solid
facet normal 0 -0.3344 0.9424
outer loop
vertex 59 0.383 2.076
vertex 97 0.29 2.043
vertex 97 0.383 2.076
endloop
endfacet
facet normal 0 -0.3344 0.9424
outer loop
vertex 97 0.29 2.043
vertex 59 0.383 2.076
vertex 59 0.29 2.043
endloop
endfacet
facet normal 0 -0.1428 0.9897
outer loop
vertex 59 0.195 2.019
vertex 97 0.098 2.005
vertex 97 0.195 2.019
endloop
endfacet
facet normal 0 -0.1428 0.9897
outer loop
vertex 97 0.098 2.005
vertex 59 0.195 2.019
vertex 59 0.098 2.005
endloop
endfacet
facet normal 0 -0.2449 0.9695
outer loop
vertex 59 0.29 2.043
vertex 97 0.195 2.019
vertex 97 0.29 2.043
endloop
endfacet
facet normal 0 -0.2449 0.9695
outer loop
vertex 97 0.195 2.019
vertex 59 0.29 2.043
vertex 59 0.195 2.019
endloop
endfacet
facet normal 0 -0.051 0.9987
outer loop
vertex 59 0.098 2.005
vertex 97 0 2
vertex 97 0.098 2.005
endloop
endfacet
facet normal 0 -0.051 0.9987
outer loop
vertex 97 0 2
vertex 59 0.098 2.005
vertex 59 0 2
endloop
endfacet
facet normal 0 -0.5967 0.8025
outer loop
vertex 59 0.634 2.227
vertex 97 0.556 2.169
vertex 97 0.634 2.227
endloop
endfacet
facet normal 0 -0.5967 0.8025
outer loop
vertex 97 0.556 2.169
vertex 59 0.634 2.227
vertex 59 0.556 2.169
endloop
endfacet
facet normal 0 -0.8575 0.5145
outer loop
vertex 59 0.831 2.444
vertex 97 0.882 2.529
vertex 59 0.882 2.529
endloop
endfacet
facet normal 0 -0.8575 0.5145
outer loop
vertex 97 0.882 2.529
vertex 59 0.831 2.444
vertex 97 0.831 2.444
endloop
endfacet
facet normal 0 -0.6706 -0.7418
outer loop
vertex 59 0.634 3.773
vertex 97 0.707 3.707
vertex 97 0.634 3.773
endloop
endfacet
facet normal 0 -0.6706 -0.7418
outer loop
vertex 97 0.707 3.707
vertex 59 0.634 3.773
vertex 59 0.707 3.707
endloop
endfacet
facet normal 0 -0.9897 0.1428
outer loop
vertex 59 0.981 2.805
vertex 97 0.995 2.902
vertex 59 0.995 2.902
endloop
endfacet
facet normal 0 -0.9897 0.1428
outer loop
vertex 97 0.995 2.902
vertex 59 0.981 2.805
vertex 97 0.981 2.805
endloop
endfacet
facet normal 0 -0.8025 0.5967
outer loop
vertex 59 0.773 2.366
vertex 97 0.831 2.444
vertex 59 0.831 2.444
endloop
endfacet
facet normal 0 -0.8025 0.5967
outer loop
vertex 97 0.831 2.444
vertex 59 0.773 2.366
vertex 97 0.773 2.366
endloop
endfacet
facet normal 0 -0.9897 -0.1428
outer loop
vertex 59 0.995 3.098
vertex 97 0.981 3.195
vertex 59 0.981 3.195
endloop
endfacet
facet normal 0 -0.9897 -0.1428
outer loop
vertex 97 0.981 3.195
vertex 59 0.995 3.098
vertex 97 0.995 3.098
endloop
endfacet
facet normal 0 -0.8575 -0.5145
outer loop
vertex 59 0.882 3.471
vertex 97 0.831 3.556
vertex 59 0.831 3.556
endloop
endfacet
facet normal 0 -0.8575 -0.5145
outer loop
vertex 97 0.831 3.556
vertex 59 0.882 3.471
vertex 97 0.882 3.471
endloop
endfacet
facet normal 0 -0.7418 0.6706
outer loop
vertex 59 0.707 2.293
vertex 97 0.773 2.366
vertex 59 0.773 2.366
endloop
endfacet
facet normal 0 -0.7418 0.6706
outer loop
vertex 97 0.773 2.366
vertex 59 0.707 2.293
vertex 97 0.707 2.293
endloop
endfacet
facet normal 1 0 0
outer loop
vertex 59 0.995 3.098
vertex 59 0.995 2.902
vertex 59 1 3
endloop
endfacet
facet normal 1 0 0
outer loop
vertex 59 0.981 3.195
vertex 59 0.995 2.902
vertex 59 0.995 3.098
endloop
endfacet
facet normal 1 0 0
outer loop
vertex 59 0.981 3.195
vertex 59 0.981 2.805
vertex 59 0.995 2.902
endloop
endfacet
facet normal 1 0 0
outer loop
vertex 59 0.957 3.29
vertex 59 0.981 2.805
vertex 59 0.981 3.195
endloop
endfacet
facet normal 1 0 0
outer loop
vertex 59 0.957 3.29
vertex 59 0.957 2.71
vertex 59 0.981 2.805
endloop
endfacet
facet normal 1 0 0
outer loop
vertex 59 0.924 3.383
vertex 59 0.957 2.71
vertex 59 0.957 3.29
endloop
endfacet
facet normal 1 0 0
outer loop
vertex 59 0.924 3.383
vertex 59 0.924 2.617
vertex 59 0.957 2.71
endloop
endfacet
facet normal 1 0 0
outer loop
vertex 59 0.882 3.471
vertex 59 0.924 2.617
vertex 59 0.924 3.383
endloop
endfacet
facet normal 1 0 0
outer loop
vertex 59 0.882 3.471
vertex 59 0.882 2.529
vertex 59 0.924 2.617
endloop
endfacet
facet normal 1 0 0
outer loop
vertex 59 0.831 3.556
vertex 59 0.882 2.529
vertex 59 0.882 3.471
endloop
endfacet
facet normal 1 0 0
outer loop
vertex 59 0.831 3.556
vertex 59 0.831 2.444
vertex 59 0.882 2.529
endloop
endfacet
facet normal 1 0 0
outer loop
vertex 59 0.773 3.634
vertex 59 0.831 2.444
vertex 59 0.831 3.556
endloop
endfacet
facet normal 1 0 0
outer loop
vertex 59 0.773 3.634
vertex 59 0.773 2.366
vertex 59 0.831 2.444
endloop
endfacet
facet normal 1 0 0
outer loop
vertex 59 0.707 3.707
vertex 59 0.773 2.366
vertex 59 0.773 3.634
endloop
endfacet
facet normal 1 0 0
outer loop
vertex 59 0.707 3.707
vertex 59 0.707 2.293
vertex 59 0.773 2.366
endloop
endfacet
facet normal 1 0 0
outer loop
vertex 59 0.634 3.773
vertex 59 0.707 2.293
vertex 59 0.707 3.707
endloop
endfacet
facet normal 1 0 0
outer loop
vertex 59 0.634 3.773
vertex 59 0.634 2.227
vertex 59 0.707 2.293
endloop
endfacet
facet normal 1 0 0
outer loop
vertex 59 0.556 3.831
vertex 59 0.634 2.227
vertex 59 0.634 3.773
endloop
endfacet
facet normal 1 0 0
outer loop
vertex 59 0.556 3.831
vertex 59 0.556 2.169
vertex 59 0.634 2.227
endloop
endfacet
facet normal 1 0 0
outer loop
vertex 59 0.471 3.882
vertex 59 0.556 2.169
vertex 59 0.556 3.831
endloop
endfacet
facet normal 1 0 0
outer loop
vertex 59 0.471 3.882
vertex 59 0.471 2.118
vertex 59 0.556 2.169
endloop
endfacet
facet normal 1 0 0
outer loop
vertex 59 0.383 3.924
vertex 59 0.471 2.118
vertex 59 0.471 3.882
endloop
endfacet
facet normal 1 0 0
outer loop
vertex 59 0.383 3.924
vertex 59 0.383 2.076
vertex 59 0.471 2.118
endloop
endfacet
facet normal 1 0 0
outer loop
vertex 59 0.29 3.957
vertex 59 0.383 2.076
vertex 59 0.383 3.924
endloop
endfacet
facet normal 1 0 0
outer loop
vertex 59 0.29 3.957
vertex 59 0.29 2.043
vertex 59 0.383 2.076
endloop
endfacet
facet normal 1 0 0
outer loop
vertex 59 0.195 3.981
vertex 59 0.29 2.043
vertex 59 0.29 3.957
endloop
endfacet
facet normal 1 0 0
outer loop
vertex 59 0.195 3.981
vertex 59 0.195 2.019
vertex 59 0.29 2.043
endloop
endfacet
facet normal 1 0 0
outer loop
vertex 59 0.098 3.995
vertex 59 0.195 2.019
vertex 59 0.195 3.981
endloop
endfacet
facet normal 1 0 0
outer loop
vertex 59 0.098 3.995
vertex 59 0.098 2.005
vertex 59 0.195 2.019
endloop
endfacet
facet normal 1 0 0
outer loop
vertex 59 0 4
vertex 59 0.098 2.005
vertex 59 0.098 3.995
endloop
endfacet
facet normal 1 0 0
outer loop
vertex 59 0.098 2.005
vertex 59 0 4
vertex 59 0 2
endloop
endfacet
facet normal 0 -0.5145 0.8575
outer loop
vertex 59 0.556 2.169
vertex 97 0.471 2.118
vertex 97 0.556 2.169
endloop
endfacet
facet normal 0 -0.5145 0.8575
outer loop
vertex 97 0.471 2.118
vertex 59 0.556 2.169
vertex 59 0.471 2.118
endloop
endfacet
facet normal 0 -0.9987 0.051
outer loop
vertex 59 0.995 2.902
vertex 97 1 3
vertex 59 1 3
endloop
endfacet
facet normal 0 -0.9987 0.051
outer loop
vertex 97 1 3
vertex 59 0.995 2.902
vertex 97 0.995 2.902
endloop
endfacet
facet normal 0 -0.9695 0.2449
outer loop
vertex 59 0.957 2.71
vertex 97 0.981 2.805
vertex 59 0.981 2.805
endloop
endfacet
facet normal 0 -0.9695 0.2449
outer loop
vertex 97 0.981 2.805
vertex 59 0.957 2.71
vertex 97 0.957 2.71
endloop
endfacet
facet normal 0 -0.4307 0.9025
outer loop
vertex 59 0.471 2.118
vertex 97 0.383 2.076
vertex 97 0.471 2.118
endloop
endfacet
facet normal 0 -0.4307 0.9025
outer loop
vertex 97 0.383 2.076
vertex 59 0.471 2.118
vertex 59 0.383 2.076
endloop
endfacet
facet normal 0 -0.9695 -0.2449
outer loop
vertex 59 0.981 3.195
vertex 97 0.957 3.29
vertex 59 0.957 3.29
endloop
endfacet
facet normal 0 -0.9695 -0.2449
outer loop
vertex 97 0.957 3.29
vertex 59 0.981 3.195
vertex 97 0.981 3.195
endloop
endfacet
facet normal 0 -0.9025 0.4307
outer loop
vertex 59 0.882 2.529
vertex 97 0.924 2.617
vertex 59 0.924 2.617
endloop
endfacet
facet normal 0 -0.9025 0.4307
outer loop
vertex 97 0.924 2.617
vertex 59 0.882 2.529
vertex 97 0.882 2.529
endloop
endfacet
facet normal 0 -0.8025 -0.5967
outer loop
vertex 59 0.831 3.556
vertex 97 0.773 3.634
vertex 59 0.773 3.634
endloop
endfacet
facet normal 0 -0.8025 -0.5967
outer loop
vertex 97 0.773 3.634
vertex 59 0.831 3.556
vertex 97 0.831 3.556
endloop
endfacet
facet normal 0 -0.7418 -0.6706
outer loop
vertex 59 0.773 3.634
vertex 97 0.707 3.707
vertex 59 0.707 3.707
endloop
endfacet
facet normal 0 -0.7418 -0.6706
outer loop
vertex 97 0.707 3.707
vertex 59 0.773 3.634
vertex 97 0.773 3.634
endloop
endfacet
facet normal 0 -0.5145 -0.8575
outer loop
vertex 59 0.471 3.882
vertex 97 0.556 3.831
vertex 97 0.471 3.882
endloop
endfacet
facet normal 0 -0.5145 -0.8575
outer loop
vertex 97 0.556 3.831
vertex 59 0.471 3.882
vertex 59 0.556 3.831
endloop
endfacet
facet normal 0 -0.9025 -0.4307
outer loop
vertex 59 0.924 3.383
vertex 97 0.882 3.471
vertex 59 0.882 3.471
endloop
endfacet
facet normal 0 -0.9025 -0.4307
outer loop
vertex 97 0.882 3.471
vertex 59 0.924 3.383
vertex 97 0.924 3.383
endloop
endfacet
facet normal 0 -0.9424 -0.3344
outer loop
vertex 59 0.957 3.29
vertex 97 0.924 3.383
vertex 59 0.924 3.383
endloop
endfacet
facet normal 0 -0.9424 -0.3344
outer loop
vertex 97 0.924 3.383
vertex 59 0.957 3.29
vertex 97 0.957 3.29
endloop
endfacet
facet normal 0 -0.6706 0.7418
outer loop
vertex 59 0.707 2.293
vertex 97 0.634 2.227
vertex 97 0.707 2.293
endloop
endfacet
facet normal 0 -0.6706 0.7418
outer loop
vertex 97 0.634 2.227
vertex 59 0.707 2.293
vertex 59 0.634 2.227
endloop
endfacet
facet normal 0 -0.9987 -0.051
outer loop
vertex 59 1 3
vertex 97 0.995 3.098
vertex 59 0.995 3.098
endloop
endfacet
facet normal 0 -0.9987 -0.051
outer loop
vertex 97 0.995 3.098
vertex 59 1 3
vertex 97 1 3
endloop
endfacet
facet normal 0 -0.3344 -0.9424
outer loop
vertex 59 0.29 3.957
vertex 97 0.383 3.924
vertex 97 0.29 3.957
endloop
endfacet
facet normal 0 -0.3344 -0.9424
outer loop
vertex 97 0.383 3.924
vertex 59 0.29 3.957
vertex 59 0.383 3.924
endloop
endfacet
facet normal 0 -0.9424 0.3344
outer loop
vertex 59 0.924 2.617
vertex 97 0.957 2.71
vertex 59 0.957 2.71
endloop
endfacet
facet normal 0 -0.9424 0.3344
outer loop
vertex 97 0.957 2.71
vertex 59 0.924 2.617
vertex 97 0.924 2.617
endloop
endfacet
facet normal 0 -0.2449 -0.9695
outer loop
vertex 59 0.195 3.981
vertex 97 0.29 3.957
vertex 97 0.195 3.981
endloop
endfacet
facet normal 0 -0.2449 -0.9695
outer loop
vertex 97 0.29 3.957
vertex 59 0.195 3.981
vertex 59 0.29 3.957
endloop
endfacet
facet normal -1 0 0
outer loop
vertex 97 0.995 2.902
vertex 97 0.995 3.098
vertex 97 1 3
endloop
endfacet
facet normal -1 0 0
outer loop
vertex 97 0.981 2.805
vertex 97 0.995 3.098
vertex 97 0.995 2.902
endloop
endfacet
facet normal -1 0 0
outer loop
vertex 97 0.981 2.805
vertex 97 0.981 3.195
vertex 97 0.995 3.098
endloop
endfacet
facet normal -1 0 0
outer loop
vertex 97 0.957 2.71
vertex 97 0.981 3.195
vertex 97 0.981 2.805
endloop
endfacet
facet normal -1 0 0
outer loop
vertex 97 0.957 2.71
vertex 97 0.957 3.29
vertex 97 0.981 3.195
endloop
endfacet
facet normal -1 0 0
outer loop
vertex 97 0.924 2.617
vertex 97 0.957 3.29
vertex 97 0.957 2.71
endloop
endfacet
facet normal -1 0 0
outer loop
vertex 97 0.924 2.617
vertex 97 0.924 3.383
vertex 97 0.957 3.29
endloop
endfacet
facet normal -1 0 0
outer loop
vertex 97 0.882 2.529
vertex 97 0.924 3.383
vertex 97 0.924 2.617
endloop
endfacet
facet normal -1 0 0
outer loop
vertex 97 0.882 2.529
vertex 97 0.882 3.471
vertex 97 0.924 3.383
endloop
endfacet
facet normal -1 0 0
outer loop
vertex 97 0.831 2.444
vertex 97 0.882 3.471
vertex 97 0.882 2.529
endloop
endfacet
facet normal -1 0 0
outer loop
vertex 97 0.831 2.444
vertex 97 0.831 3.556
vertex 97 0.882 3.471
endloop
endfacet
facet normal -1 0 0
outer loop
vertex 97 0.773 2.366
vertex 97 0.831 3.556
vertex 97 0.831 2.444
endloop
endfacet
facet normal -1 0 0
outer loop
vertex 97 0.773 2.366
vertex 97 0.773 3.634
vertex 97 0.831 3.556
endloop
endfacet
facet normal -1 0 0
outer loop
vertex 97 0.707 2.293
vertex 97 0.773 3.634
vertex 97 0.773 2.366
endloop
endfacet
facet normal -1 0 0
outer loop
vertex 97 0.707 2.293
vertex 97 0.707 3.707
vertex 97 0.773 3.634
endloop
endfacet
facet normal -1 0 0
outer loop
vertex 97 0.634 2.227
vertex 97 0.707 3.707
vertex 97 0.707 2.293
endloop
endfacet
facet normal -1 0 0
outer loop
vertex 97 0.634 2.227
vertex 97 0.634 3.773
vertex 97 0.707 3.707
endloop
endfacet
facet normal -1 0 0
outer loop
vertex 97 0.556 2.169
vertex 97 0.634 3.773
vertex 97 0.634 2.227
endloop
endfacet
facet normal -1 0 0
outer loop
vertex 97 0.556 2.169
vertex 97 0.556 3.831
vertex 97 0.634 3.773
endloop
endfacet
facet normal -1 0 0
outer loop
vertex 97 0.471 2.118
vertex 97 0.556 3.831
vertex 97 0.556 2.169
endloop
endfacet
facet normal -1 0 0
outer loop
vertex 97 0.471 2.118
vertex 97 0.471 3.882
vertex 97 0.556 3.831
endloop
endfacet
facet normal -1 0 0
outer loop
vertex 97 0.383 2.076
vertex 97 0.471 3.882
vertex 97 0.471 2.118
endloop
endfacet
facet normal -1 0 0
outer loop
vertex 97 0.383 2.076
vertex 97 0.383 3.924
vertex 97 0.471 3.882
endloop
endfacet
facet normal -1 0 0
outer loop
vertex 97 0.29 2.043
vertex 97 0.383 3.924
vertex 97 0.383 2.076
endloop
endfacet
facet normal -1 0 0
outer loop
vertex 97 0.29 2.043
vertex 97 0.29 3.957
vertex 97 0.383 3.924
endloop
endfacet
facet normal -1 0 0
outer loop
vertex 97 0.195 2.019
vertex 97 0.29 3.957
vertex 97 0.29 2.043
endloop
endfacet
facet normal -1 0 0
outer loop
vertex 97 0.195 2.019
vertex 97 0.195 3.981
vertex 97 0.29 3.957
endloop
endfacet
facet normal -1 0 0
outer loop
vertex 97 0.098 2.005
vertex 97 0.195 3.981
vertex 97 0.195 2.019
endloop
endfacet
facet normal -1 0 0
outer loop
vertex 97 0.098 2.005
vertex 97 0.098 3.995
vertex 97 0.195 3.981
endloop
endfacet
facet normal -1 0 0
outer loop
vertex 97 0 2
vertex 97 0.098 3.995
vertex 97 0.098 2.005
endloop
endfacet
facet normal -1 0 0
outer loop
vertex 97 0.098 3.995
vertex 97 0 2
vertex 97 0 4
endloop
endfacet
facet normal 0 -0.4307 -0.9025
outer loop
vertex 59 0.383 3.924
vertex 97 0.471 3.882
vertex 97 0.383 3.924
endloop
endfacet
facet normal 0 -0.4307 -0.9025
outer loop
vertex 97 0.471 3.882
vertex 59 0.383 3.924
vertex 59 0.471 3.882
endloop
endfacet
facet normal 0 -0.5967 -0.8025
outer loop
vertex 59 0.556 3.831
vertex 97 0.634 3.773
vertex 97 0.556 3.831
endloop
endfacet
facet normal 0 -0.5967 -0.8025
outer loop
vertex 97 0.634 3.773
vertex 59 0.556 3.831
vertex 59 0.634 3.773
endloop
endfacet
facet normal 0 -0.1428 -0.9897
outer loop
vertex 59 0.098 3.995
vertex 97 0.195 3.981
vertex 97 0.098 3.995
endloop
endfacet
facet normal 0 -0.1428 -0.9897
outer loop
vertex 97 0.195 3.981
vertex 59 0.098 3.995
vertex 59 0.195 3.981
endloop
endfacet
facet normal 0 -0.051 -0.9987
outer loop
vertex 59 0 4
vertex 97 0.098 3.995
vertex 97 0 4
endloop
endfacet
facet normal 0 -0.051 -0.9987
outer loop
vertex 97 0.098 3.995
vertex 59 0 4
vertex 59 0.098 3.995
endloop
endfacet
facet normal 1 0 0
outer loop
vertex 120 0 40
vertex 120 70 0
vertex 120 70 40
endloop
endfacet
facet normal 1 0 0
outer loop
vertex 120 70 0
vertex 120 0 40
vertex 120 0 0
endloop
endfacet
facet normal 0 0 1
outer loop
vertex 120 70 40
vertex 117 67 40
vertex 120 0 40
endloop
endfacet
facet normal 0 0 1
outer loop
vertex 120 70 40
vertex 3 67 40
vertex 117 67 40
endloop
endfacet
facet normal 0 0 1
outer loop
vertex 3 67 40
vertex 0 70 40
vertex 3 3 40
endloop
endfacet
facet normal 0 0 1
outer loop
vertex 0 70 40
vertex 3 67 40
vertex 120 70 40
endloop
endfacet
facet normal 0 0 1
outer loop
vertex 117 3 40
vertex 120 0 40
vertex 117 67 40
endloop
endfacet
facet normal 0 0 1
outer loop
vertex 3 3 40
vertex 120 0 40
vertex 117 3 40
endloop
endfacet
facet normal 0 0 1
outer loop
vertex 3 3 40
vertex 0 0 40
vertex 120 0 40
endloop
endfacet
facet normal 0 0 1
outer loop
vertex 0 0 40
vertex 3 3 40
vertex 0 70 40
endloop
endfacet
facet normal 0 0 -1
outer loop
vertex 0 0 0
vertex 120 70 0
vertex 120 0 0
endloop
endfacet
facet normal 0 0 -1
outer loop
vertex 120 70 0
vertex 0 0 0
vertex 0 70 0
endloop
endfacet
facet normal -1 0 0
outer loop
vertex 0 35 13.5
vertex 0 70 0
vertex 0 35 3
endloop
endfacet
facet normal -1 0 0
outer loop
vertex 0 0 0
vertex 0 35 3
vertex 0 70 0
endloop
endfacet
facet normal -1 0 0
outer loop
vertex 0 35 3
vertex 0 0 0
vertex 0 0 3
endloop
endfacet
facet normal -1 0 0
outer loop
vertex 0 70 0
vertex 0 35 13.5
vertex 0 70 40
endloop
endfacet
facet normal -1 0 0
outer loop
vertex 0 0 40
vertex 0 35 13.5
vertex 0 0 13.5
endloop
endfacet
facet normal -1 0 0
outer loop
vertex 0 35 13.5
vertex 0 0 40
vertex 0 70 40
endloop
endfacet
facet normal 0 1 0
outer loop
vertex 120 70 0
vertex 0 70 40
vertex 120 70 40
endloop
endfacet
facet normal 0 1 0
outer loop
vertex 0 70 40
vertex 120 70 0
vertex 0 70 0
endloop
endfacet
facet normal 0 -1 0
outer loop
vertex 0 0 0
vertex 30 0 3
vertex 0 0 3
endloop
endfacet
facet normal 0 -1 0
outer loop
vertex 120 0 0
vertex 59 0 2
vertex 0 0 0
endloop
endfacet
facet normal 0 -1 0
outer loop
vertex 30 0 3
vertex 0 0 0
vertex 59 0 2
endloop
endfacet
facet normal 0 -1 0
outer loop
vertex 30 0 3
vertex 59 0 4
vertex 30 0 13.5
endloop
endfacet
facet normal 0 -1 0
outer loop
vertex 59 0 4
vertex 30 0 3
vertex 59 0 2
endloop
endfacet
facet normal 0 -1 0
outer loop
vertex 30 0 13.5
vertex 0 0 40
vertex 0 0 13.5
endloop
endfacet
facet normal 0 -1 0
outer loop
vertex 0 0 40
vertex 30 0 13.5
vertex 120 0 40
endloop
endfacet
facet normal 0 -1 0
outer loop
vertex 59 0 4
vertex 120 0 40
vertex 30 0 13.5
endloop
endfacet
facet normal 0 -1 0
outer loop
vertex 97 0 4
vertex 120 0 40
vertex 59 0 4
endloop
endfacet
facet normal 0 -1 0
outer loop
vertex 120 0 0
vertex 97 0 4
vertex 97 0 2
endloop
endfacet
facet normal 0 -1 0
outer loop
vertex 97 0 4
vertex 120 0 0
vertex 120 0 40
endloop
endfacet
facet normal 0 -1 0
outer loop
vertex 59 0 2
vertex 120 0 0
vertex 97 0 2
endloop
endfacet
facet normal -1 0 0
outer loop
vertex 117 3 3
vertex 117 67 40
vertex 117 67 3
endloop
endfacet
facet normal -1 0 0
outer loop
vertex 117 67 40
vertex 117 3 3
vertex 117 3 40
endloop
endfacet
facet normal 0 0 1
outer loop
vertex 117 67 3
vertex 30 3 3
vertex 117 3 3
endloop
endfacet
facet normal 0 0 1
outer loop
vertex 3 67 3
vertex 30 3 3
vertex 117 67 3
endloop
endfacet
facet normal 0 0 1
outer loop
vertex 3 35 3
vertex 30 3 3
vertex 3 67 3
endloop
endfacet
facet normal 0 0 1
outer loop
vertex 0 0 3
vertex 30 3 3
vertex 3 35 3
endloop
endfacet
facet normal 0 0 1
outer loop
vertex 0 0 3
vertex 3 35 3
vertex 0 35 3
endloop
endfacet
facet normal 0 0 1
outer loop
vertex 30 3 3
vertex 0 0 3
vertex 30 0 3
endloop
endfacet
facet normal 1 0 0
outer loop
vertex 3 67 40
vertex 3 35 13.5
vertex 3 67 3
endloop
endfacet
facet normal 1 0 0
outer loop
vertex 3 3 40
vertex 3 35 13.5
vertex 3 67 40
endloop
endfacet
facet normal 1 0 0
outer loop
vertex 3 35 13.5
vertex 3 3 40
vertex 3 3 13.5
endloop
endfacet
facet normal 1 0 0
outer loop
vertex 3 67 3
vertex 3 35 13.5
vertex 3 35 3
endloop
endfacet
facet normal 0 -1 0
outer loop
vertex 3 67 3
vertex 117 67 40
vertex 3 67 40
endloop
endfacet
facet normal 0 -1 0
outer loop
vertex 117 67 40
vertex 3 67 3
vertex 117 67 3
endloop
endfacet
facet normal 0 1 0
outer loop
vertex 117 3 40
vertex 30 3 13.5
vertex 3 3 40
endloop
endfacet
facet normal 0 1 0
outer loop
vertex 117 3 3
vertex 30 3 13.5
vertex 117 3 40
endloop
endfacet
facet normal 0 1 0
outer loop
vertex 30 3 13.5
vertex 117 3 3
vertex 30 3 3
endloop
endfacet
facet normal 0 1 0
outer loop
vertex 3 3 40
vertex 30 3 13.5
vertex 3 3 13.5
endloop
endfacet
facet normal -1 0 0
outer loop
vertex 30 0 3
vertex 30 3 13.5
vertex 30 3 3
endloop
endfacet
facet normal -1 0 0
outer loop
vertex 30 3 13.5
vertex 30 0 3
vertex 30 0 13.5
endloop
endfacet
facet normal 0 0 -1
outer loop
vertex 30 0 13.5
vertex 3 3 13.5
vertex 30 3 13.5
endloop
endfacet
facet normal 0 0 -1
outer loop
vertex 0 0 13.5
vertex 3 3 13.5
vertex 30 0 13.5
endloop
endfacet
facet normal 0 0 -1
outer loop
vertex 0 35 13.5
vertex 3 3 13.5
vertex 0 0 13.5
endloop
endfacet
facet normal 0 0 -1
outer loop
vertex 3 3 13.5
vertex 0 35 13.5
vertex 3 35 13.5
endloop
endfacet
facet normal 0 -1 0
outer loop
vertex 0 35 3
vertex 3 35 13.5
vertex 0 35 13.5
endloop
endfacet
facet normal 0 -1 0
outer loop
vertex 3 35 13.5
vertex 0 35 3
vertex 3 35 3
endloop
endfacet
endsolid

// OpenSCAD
// Buffer tank for mini horizontal gel-electrophoresis box
// Units: mm. Tank rests on XY plane at z = 0, builds upward (+Z).

$fn = 64;

// ---- Tank ----
tank_x      = 120;   // outer length (X)
tank_y      = 70;    // outer width (Y)
tank_h      = 40;    // outer height (Z)
wall        = 3;     // wall thickness
floor_t     = 3;     // floor thickness

// ---- Gel-tray platform ----
plat_x      = 60;    // platform length in X (centred)
plat_top_z  = 13;    // platform top height above inner floor (z = 13)

// ---- Electrode holes ----
hole_d      = 2;     // electrode hole diameter
hole_y      = 0;     // electrode hole Y position
hole_w_z    = tank_h - floor_t; // hole length along Z (through end wall)

// ---- Misc ----
eps         = 0.5;   // cutter overshoot past faces

// ---- Model ----
difference() {
    // Outer tank shell
    cube([tank_x, tank_y, tank_h]);

    // Inner cavity, from top of floor to tank top (open top)
    translate([wall, wall, floor_t])
        cube([tank_x - 2 * wall, tank_y - 2 * wall, tank_h - floor_t + eps]);

    // Raised platform in middle of tank
    translate([-plat_x / 2, -tank_y / 2, floor_t])
        cube([plat_x, tank_y, plat_top_z - floor_t + eps]);

    // Horizontal electrode holes through each end wall (along X)
    for (side = [-1, 1])
        translate([side * (tank_x / 2 - hole_d / 2), hole_y, floor_t])
            rotate([0, 90, 0])
                cylinder(d = hole_d, h = hole_w_z + 2 * eps);
}
